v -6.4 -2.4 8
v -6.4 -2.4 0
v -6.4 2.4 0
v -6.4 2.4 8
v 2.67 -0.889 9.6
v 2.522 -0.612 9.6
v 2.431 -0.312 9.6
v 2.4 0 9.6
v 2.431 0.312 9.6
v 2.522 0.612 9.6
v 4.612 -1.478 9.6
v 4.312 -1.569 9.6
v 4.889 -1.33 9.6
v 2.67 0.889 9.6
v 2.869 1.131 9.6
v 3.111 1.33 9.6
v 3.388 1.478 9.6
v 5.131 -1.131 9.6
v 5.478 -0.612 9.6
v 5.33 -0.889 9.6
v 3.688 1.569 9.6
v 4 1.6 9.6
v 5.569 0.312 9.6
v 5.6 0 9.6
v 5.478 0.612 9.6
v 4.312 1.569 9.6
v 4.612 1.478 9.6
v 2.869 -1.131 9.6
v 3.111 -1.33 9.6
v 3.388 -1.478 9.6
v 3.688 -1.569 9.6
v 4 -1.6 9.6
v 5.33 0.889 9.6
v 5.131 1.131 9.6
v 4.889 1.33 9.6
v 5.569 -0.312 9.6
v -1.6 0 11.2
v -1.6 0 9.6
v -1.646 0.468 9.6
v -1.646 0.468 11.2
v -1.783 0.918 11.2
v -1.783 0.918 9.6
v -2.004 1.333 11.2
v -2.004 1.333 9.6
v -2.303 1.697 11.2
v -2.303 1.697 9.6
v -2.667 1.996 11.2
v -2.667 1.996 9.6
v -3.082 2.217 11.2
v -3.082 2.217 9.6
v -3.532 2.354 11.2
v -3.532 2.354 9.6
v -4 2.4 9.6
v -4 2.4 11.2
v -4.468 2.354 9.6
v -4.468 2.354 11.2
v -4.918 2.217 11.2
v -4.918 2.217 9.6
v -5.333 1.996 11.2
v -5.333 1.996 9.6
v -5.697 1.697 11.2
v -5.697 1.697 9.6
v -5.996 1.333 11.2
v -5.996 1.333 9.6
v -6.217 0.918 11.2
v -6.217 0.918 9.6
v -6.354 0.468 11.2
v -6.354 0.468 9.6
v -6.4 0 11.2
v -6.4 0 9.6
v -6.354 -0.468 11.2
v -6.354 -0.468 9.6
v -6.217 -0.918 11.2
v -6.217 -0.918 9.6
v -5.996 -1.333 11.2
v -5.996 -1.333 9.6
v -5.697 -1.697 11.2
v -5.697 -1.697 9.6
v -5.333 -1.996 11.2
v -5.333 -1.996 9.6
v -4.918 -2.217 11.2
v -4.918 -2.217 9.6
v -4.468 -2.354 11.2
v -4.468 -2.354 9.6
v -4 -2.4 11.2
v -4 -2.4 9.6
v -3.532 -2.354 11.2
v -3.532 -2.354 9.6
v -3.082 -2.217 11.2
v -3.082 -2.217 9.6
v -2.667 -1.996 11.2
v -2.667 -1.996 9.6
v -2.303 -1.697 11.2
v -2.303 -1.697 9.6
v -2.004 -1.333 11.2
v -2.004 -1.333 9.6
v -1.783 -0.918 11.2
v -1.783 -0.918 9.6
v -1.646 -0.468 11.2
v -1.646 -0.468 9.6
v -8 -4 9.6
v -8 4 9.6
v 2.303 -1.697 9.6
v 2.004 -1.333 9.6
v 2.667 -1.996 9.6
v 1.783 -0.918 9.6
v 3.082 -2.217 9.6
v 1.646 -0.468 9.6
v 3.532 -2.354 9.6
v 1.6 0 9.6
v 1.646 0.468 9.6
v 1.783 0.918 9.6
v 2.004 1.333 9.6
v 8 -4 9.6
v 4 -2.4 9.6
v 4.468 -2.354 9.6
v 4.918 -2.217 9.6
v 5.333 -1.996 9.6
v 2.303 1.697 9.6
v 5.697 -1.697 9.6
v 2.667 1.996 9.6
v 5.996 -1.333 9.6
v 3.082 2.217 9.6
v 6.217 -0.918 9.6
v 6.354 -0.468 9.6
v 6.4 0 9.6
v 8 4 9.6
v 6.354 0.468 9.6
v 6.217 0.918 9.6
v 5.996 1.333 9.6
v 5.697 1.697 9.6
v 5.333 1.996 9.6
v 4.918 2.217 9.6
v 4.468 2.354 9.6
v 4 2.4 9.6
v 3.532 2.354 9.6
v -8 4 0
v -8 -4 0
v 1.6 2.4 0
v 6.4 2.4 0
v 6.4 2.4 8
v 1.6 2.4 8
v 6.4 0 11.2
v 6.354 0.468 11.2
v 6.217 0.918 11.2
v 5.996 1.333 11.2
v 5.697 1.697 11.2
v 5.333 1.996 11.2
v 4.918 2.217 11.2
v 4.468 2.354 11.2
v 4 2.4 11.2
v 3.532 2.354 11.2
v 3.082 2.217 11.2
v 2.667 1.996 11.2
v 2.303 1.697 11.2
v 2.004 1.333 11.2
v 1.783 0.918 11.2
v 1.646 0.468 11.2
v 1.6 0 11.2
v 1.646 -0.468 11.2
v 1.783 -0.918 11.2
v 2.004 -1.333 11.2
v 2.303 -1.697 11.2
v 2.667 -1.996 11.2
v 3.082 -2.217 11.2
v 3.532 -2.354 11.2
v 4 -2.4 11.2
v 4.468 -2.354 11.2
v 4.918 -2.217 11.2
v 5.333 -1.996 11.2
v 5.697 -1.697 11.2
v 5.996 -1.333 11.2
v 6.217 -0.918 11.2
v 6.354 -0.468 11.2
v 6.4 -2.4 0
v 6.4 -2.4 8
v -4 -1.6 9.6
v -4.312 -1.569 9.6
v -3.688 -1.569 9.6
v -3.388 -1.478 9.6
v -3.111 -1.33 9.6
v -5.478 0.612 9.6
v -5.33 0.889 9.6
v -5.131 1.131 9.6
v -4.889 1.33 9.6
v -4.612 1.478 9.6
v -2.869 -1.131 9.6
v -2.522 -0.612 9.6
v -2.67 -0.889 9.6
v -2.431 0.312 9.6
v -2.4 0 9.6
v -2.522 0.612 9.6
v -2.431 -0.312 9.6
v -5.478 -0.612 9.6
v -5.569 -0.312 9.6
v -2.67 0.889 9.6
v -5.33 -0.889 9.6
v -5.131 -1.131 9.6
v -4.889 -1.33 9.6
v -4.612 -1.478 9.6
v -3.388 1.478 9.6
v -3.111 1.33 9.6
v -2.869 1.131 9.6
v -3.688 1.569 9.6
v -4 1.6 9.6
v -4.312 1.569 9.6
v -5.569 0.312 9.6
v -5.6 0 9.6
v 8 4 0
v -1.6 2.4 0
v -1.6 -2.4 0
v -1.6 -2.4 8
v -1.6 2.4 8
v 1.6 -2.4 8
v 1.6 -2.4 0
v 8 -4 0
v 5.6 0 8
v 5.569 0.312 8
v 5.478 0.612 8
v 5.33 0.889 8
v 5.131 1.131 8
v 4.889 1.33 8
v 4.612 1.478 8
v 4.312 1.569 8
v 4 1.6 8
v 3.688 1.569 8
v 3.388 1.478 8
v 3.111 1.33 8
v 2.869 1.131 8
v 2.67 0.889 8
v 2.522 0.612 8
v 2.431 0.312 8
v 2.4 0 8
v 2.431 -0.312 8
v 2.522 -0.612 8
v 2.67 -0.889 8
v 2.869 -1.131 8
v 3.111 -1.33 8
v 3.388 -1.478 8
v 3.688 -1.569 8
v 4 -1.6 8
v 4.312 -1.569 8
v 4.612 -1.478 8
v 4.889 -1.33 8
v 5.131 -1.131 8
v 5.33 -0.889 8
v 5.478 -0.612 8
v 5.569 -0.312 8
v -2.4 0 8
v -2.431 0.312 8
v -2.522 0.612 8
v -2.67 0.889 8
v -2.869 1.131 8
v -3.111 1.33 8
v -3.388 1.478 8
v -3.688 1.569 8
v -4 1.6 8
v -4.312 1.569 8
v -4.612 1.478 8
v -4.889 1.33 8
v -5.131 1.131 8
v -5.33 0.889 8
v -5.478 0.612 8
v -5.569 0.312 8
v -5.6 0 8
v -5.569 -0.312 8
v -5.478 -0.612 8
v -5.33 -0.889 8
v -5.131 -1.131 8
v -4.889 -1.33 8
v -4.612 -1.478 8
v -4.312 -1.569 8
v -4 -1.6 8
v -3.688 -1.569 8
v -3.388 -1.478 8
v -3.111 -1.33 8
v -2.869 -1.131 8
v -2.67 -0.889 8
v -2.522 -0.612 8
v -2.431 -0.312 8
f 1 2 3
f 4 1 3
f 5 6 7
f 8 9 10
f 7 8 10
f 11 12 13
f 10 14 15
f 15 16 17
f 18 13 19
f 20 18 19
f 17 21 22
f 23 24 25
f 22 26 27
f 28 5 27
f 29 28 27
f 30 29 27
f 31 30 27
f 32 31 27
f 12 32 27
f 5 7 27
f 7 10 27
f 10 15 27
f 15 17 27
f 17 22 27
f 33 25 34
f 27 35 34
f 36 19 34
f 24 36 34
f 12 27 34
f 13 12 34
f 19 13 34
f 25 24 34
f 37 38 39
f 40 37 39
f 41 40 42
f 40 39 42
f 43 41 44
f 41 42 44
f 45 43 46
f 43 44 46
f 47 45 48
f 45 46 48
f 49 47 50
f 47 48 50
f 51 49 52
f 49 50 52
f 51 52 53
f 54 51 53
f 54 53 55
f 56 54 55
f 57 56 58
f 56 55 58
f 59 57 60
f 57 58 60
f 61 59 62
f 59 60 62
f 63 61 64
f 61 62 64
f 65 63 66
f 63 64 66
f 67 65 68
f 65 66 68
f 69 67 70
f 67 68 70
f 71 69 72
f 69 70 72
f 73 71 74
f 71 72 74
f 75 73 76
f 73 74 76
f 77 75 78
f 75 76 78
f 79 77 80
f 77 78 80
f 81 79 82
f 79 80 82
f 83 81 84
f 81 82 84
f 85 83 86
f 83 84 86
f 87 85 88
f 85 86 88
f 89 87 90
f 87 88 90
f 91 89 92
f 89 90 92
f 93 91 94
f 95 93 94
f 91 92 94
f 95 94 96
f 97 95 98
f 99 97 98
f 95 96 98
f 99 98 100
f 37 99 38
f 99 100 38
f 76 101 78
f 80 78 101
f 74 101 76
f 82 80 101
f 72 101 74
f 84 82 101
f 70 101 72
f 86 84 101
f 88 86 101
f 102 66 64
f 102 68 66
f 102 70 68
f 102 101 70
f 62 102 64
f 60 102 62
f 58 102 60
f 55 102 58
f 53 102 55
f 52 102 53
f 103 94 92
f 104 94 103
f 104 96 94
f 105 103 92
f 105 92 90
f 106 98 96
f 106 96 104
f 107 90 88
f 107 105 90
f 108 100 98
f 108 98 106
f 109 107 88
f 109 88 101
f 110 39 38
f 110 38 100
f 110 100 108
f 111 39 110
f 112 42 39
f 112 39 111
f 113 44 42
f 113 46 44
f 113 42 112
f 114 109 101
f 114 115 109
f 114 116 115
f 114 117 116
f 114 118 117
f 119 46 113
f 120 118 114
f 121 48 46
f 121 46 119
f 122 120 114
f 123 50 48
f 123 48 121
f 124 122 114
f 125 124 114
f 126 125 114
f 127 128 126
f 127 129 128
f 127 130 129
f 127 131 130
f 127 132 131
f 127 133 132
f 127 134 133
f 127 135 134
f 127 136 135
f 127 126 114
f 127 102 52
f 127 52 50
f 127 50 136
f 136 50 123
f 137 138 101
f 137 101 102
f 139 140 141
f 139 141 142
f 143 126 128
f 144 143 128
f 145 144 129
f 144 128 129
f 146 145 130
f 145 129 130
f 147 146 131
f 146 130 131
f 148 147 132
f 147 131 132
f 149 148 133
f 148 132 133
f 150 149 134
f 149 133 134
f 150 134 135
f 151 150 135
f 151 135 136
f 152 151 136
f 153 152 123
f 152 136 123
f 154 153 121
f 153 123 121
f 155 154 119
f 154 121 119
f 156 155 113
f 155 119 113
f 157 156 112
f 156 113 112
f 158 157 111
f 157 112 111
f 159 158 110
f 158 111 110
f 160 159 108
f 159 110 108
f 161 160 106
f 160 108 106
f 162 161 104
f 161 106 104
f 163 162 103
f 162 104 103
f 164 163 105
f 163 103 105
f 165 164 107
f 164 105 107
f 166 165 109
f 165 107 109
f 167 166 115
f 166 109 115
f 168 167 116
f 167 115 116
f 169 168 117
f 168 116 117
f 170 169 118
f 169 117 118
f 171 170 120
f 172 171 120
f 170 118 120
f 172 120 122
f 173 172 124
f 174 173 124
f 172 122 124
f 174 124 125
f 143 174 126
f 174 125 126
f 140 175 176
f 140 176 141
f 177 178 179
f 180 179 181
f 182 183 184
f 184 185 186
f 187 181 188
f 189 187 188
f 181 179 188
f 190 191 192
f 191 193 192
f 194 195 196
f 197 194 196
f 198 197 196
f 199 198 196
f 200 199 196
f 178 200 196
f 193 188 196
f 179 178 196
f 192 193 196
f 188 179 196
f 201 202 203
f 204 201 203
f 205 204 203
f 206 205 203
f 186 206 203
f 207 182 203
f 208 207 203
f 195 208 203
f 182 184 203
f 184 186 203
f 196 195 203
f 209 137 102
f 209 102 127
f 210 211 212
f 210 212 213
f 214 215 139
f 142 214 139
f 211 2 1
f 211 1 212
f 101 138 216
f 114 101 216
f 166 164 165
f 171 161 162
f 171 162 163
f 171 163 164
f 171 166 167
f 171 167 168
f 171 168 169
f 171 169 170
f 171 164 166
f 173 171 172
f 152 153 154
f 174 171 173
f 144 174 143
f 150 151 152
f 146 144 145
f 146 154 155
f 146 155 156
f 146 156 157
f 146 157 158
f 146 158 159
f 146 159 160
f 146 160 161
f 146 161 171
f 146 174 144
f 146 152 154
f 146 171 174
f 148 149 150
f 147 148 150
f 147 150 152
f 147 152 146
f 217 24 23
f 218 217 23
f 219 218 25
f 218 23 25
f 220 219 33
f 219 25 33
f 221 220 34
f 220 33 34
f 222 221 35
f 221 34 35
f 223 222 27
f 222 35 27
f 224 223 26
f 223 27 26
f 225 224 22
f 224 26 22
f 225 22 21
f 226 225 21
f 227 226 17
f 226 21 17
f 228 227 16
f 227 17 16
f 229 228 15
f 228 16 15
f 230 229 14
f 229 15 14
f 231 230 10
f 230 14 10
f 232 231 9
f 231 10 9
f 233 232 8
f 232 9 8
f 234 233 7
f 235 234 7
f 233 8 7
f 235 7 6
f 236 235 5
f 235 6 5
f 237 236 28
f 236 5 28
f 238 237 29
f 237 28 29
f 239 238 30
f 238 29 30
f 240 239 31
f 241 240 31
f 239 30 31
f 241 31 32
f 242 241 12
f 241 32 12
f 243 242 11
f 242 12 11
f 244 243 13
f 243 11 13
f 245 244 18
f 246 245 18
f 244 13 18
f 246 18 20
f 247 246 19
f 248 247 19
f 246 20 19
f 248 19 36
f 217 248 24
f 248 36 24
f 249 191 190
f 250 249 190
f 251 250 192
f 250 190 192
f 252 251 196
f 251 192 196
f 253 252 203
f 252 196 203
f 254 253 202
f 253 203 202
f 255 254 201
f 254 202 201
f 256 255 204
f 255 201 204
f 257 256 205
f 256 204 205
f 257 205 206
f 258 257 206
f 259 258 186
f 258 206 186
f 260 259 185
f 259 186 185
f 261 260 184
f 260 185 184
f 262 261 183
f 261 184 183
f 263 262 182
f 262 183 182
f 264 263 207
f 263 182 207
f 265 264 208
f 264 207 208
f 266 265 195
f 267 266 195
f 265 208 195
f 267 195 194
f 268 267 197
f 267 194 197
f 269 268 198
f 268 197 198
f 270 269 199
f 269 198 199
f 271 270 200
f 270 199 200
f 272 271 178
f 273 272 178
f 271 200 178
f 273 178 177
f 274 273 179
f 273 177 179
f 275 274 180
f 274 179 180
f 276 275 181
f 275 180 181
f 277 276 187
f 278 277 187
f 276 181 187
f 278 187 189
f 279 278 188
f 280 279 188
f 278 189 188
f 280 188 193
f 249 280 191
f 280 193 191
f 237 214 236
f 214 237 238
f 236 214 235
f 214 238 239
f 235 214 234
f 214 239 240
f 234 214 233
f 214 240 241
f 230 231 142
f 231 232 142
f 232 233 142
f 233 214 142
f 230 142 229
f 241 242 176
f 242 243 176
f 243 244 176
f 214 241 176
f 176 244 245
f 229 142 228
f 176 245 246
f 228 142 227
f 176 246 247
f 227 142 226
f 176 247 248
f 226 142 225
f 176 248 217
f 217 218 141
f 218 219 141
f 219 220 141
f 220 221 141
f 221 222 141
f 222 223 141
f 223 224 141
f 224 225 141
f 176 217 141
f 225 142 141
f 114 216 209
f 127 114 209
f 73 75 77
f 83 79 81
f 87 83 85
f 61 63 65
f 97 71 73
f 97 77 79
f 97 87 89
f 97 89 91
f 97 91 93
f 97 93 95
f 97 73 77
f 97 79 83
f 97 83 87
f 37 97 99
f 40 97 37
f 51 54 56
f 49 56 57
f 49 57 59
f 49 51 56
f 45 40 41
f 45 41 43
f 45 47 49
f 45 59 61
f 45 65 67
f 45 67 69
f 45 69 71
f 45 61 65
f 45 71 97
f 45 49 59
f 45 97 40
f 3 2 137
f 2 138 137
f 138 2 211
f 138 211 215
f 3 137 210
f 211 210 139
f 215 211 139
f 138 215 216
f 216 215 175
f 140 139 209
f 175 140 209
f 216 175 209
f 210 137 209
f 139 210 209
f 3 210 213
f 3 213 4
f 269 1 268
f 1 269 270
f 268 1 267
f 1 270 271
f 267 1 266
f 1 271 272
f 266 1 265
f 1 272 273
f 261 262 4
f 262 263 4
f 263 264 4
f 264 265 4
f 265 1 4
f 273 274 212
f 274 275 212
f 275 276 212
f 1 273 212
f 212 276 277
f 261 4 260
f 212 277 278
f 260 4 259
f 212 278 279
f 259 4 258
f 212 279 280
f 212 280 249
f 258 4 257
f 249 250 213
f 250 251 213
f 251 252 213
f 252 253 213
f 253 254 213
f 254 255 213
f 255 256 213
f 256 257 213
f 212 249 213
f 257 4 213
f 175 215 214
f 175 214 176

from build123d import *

# Parameters (mm, degrees)
F0_W     = 16
F0_H     = 8
F0_W_2   = 4.8
F0_H_2   = 4.8
F0_W_3   = 3.2
F1_DEPTH = 9.6
F2_DEPTH = 8
F3_DEPTH = 9.6
F4_R     = 1.6
F5_DEPTH = 1.6
F6_R     = 2.4
F6_R_2   = 1.6
F7_DEPTH = 1.6


with BuildPart() as f1:
    # F0 (on Top) → F1 (new body)
    with BuildSketch(Plane.XY):
        Rectangle(F0_W, F0_H)
        Polygon((-1.6, -2.4), (-6.4, -2.4), (-6.4, 2.4), (-1.6, 2.4), (1.6, 2.4), (6.4, 2.4), (6.4, -2.4), (1.6, -2.4), align=None, mode=Mode.SUBTRACT)
        with Locations((-4, 0)):
            Rectangle(F0_W_2, F0_H_2)
        Rectangle(F0_W_3, F0_H_2)
        with Locations((4, 0)):
            Rectangle(F0_W_2, F0_H_2)
    extrude(amount=F1_DEPTH)

    # F0 (on Top) → F2 (cut)
    with BuildSketch(Plane.XY):
        with Locations((-4, 0)):
            Rectangle(F0_W_2, F0_H_2)
        Rectangle(F0_W_3, F0_H_2)
        with Locations((4, 0)):
            Rectangle(F0_W_2, F0_H_2)
    extrude(amount=F2_DEPTH, mode=Mode.SUBTRACT)

    # F0 (on Top) → F3 (join)
    with BuildSketch(Plane.XY):
        Rectangle(F0_W_3, F0_H_2)
    extrude(amount=F3_DEPTH)

    # F4 (on face) → F5 (cut)
    with BuildSketch(Plane.XY.offset(9.6)):
        with Locations((-4, 0)):
            Circle(F4_R)
        with Locations((4, 0)):
            Circle(F4_R)
    extrude(amount=-F5_DEPTH, mode=Mode.SUBTRACT)

    # F6 (on face) → F7 (join)
    with BuildSketch(Plane.XY.offset(9.6)):
        with Locations((-4, 0)):
            Circle(F6_R)
        with Locations((-4, 0)):
            Circle(F6_R_2, mode=Mode.SUBTRACT)
        with Locations((4, 0)):
            Circle(F6_R)
        with Locations((4, 0)):
            Circle(F6_R_2, mode=Mode.SUBTRACT)
        with Locations((-4, 0)):
            Circle(F6_R_2)
        with Locations((4, 0)):
            Circle(F6_R_2)
    extrude(amount=F7_DEPTH)


solid = f1.part
